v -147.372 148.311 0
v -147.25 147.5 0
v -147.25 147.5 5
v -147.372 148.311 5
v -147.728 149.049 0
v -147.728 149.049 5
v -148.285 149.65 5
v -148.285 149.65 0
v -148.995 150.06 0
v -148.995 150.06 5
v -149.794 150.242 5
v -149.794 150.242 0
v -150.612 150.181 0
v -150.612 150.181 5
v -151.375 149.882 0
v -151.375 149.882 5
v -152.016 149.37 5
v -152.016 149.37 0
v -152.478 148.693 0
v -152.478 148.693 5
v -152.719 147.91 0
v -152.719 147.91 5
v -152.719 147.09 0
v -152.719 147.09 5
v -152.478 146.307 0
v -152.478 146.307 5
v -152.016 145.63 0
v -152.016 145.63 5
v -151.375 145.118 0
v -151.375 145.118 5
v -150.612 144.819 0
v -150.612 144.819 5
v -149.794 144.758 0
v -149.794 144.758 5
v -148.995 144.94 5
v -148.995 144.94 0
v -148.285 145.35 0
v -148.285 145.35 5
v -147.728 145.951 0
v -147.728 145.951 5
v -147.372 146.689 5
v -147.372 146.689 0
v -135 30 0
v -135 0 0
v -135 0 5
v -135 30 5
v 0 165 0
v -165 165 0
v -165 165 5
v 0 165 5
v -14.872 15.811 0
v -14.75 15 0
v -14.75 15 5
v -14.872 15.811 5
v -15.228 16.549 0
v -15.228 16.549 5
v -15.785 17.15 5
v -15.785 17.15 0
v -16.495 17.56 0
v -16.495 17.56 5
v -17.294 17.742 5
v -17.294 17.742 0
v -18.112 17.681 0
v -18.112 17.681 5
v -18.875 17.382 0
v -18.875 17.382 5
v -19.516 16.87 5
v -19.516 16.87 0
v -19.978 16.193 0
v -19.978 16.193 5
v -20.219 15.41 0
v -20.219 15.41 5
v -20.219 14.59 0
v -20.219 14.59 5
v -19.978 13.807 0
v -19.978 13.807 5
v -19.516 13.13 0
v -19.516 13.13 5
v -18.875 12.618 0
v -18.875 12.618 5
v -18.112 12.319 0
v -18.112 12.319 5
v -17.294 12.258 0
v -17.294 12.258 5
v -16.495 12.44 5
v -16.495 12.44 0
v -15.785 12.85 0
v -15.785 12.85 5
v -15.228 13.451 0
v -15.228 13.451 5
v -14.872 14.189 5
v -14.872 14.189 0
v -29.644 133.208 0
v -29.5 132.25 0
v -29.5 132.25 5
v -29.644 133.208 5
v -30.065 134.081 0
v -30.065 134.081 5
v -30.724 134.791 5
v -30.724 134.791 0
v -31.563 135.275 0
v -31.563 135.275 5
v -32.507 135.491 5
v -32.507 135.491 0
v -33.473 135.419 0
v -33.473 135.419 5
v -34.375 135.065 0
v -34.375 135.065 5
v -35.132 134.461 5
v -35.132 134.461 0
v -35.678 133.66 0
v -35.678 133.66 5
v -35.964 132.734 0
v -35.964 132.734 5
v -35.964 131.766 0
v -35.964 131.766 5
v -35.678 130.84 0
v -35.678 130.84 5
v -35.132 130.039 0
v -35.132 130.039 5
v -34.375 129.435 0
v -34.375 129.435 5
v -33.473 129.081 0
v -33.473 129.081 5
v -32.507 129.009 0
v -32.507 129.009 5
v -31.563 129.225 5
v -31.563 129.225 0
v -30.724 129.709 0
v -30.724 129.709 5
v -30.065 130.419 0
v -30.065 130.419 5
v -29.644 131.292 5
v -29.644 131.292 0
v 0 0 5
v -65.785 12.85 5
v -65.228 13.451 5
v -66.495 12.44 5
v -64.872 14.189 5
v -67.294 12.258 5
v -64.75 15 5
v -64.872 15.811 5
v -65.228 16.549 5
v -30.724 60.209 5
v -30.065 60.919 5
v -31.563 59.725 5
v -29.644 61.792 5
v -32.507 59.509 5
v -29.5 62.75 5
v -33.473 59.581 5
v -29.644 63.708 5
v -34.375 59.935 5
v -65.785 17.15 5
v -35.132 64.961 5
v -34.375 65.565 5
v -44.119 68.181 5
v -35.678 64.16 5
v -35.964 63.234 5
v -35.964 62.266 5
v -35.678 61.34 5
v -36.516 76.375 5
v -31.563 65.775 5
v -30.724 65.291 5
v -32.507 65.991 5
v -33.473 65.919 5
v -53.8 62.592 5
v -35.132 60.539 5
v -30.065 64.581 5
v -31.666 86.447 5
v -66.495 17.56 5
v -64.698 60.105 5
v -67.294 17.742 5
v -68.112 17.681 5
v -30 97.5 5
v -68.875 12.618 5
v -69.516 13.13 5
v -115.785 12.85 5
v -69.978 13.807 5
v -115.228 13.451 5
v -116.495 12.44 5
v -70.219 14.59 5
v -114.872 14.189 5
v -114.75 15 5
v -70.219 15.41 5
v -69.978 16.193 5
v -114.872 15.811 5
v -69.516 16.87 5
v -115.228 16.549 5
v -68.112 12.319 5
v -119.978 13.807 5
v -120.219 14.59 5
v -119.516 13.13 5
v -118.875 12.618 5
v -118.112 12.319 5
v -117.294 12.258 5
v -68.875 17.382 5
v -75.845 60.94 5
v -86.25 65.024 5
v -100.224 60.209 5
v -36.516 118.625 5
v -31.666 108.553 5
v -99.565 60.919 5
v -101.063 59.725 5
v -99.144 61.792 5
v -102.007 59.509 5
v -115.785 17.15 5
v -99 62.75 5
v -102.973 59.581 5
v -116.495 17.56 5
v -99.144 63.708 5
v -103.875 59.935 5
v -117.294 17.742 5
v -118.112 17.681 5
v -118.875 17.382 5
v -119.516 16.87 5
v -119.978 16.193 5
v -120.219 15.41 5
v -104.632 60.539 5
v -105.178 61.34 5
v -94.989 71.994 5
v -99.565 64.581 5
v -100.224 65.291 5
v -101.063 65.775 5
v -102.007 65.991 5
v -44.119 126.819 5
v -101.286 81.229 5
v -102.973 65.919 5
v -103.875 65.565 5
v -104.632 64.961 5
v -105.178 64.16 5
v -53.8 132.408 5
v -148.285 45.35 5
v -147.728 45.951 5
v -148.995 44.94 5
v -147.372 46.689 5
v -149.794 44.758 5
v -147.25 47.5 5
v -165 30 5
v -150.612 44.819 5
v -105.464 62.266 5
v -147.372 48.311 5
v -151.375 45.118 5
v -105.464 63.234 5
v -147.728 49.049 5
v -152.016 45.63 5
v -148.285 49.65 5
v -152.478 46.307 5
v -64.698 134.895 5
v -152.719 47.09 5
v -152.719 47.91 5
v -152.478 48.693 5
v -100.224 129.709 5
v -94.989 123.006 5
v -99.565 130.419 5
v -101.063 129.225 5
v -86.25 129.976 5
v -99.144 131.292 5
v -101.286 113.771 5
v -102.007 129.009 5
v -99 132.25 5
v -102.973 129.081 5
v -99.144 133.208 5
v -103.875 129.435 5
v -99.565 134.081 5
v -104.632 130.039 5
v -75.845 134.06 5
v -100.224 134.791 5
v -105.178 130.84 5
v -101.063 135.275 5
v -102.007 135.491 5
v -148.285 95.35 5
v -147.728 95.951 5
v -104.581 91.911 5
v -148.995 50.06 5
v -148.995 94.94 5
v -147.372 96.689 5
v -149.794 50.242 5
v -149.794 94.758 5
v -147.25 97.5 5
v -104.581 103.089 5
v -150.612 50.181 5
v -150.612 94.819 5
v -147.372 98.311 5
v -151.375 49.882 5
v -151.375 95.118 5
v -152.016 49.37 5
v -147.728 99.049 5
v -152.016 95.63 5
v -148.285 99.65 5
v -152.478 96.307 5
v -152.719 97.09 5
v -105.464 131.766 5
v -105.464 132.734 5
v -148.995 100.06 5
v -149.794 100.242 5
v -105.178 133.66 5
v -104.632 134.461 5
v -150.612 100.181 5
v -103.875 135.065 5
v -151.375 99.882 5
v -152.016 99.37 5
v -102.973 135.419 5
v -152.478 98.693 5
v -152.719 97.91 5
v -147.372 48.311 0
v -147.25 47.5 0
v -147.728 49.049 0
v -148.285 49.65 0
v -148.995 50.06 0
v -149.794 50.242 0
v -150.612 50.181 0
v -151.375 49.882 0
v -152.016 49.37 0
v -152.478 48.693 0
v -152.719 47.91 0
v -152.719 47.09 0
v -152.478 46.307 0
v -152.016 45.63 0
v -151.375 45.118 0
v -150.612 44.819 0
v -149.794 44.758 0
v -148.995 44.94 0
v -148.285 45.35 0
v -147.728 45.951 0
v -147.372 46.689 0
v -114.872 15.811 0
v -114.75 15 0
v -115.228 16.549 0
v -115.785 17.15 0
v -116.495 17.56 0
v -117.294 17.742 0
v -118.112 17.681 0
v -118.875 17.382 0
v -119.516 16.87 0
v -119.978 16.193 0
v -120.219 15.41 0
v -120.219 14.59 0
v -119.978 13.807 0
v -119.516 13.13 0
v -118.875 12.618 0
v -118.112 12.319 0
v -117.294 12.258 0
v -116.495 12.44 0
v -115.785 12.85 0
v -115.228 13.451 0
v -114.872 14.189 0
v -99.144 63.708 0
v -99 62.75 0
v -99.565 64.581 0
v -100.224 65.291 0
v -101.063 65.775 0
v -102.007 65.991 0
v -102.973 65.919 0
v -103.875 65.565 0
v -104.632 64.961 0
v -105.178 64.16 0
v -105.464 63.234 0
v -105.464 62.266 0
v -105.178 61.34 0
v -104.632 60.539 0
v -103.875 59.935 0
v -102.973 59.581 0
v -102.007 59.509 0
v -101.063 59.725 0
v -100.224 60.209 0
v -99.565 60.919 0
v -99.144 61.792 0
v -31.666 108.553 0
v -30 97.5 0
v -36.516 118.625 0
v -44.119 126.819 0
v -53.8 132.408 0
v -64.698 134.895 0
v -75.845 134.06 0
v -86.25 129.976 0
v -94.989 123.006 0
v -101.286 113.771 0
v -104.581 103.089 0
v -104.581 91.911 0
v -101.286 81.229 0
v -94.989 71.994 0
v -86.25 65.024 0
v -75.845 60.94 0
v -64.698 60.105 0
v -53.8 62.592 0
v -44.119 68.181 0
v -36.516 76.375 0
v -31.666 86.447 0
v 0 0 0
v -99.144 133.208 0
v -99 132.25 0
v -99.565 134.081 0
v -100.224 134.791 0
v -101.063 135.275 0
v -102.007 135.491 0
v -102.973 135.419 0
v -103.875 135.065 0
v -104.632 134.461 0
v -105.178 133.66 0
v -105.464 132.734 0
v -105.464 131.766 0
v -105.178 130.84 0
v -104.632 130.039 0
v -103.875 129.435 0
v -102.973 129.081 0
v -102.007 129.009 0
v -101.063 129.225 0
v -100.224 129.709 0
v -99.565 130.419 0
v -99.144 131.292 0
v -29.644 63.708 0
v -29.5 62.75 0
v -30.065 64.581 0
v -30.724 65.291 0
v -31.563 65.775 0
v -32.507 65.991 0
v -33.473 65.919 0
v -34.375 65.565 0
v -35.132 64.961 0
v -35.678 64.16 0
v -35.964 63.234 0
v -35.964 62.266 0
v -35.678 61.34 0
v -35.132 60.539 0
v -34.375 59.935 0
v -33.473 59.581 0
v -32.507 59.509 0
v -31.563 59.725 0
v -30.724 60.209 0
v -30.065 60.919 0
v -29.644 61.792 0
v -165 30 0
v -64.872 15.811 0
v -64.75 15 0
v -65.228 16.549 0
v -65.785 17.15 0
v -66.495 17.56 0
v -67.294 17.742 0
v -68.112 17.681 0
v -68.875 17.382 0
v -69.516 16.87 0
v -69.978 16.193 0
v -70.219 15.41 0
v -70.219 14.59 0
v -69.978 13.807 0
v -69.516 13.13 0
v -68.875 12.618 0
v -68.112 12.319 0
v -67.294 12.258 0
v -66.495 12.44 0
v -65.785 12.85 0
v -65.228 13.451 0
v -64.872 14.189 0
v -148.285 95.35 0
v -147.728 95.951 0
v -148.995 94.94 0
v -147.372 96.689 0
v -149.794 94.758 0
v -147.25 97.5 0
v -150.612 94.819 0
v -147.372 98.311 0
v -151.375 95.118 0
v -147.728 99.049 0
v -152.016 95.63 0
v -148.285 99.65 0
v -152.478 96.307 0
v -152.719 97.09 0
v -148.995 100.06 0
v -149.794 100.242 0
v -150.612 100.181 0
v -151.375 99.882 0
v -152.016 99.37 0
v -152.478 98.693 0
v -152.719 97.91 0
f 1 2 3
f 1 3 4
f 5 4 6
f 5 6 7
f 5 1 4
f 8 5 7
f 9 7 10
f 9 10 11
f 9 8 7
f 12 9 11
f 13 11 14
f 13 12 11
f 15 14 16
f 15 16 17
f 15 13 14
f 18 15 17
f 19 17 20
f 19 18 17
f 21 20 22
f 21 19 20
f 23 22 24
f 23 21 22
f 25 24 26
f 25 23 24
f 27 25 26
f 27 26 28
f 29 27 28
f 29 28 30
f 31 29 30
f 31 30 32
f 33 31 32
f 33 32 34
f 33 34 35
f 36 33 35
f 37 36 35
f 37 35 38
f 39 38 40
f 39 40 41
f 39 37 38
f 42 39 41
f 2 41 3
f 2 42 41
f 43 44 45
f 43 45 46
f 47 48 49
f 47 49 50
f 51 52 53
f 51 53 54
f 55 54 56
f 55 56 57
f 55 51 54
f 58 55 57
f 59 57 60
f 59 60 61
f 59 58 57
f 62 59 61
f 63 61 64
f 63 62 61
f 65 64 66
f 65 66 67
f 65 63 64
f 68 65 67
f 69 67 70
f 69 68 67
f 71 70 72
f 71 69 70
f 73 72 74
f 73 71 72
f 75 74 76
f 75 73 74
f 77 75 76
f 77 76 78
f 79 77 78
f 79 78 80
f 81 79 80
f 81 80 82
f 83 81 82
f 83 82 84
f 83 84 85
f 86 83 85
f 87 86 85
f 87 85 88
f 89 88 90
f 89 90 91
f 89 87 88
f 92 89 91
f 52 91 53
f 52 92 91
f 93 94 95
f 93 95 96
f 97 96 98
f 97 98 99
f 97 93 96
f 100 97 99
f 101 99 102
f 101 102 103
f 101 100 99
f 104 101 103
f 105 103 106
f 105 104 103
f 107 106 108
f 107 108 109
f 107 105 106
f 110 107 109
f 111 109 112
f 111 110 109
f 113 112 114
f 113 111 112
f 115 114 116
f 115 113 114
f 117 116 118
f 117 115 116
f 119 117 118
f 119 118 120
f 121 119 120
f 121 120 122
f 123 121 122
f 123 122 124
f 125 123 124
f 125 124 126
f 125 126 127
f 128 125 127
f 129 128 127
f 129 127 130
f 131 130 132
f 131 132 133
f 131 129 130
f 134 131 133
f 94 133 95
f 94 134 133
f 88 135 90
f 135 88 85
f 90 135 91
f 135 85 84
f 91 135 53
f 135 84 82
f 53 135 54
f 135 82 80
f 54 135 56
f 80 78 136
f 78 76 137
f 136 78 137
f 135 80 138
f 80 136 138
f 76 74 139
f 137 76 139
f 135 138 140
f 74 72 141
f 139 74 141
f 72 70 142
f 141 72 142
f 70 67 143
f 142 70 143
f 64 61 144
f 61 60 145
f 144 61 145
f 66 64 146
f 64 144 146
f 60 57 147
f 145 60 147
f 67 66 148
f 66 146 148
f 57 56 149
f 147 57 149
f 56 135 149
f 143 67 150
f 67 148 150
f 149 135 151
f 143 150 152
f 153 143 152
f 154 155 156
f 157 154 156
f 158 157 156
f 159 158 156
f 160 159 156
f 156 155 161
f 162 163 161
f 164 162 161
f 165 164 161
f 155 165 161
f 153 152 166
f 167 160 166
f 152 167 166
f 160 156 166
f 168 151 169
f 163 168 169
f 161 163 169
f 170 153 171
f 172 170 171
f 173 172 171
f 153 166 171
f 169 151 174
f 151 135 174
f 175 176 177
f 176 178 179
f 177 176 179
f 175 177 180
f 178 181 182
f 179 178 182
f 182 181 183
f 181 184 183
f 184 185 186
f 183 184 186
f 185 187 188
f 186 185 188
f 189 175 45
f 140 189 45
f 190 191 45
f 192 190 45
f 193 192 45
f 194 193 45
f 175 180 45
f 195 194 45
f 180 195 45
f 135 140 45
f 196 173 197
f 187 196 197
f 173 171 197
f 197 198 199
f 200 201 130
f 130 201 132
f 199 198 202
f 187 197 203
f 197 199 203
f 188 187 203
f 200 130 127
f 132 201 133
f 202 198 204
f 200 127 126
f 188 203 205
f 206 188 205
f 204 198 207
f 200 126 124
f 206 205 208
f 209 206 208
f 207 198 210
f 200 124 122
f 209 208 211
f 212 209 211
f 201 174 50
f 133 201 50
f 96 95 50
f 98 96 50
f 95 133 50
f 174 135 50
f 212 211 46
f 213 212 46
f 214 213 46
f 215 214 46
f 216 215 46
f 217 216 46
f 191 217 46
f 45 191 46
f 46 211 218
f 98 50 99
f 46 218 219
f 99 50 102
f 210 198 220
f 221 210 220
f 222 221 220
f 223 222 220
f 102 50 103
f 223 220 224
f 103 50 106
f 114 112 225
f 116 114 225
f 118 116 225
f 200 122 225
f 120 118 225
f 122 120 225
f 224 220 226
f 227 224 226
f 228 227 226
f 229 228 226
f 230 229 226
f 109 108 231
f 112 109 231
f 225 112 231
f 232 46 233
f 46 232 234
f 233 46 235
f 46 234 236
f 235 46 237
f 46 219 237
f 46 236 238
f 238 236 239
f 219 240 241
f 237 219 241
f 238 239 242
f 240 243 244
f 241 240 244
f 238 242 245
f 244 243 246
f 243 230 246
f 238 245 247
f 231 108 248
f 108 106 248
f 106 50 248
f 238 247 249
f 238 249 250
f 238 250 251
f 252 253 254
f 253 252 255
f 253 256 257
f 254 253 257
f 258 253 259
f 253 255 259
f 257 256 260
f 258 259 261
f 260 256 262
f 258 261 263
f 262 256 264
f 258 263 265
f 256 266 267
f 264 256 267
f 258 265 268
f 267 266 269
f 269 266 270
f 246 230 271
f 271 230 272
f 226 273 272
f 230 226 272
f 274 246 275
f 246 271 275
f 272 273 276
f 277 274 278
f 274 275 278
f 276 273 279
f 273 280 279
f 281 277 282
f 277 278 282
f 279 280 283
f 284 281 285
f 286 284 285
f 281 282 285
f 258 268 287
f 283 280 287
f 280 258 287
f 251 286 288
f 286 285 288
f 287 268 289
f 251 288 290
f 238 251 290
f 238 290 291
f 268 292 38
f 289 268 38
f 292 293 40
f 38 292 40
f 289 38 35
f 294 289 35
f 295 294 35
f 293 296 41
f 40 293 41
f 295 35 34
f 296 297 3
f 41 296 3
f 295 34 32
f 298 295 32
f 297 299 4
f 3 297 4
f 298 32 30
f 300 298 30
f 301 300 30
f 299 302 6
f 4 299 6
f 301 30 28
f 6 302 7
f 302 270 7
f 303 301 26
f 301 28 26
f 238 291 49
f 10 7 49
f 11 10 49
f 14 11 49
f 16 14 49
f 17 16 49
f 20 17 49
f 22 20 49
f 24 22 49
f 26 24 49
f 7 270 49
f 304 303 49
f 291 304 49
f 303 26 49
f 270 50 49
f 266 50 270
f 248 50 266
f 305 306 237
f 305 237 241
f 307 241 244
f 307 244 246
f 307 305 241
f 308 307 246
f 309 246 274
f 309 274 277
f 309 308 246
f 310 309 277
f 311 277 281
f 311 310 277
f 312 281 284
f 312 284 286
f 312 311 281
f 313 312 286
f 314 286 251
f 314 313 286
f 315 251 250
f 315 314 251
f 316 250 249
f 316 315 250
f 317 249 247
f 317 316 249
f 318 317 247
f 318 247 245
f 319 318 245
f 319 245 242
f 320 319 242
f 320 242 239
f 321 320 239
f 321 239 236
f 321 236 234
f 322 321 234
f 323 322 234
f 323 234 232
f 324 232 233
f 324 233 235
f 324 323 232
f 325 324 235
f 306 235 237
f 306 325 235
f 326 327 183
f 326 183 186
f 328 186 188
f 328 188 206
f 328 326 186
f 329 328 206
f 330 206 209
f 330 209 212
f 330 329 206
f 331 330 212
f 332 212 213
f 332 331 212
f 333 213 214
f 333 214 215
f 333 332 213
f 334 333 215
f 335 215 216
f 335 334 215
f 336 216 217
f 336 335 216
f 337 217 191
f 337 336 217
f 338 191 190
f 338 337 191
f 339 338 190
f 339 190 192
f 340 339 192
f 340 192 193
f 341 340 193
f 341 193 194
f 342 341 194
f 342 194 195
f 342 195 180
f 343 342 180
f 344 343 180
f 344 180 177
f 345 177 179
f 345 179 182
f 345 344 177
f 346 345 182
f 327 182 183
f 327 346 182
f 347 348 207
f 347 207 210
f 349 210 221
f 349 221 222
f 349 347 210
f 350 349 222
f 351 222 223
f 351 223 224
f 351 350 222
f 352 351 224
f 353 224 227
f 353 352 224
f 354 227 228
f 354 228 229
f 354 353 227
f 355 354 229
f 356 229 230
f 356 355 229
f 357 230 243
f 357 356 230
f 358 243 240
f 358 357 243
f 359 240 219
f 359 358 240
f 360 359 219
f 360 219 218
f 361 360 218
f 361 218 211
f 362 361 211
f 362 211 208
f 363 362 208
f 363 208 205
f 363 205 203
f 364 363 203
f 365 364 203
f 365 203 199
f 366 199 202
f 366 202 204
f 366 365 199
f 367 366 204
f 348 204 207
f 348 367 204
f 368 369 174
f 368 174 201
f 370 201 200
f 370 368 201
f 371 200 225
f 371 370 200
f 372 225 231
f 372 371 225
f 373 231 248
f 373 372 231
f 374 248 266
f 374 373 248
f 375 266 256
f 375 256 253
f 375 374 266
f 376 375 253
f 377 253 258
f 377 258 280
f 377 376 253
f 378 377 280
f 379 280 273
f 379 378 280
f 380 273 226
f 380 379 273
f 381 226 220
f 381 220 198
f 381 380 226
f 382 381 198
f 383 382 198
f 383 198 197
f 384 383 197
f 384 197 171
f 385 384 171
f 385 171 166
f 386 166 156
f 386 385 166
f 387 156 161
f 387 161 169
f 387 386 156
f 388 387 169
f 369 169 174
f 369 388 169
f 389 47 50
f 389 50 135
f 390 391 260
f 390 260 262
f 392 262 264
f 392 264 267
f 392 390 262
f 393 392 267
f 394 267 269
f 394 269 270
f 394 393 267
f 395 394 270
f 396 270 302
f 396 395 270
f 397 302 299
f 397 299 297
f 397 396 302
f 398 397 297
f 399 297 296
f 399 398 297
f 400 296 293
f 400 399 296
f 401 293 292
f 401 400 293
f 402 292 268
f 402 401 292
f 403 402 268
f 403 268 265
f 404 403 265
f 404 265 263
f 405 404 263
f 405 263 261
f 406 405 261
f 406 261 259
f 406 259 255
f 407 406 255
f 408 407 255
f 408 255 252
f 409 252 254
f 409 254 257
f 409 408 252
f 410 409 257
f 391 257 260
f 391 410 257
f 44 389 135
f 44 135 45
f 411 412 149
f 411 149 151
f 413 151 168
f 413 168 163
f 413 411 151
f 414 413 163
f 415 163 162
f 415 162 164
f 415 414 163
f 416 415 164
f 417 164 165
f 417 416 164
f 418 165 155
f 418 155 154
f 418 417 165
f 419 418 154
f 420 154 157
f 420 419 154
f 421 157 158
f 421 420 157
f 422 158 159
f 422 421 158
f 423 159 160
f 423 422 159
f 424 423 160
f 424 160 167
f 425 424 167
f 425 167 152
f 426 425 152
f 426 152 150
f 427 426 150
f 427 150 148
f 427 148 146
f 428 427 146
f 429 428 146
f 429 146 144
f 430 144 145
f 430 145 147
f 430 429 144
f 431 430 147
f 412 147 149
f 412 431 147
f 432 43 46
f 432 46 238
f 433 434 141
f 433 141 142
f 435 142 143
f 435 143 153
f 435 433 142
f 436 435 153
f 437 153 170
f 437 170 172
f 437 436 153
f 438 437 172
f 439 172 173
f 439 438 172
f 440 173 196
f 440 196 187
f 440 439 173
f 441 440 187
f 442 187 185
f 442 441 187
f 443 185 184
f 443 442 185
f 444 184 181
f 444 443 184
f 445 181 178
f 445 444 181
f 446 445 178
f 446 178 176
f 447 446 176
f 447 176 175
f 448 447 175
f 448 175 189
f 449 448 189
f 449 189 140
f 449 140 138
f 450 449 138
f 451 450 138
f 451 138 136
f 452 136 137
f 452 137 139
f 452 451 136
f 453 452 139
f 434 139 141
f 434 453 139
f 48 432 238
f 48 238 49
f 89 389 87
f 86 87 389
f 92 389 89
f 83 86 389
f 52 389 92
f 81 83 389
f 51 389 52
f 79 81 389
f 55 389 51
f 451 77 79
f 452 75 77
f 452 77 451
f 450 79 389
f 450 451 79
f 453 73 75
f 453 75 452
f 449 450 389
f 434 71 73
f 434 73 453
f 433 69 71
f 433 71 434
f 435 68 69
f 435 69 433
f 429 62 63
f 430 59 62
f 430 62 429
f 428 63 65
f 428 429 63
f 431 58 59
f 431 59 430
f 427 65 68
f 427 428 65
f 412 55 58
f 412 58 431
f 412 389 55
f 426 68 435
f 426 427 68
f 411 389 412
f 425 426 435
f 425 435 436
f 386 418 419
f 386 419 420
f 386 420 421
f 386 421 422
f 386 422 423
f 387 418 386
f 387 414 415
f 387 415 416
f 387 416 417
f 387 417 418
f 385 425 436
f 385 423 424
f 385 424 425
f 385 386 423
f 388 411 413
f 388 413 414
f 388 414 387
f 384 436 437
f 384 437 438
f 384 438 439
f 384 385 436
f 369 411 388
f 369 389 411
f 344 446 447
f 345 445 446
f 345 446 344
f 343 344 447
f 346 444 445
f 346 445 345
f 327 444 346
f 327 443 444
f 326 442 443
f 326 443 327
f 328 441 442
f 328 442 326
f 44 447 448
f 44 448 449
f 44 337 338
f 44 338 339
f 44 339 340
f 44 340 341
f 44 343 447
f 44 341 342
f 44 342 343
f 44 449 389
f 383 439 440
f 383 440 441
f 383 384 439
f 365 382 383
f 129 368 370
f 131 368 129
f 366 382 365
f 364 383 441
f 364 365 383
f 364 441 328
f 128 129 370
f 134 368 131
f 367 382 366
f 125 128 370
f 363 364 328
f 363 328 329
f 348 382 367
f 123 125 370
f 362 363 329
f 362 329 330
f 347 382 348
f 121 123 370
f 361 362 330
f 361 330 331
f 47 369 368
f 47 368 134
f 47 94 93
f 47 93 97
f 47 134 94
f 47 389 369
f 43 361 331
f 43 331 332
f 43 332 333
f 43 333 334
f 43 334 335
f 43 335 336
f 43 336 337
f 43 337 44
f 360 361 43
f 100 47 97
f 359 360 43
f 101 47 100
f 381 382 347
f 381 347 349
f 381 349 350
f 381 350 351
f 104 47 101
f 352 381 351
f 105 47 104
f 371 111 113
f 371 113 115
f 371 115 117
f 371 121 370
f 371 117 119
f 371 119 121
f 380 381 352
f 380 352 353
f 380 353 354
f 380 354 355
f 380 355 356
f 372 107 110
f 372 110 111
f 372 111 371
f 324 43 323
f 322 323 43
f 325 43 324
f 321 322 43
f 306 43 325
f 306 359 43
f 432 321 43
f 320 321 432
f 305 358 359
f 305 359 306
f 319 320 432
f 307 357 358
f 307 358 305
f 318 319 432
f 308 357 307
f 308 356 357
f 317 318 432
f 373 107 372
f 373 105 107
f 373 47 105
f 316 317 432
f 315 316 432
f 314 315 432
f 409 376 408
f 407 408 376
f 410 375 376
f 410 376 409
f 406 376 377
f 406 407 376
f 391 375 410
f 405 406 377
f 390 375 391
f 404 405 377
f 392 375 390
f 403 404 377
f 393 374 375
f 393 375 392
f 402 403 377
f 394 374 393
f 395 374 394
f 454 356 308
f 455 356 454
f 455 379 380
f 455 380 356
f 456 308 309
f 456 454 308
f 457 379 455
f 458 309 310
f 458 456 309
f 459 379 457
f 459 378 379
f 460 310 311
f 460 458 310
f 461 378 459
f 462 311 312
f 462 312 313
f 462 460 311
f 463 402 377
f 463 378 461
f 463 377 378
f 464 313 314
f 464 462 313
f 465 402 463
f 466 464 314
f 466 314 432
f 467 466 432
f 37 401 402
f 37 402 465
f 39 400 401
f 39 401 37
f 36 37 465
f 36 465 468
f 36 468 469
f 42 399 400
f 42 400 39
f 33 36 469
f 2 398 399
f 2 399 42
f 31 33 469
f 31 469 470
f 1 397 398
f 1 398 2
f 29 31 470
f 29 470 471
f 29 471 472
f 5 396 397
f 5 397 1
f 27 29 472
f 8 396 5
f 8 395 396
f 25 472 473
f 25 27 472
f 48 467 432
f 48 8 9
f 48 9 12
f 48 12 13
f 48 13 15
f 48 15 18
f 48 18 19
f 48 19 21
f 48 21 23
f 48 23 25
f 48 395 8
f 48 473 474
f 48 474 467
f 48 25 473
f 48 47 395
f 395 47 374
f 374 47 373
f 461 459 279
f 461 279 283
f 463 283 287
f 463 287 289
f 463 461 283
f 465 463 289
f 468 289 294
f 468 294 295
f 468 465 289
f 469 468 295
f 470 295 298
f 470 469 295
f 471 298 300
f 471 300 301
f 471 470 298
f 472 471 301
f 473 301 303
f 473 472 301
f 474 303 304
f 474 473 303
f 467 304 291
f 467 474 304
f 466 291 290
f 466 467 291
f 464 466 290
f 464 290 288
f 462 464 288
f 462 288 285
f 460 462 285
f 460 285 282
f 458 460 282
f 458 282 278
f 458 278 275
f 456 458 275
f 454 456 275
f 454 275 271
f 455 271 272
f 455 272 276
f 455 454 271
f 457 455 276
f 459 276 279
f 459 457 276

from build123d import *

# Parameters (mm, degrees)
SKETCH_1_R      = 37.5
SKETCH_1_R_2    = 3.25
SKETCH_1_R_3    = 2.75
EXTRUDE_1_DEPTH = 5


with BuildPart() as part:
    # 草图1 → 凸台-拉伸1 (new body)
    with BuildSketch(Plane.XY):
        Polygon((0, 0), (-135, 0), (-135, 30), (-165, 30), (-165, 165), (0, 165), align=None)
        with Locations((-67.5, 97.5)):
            Circle(SKETCH_1_R, mode=Mode.SUBTRACT)
        with Locations((-102.25, 132.25)):
            Circle(SKETCH_1_R_2, mode=Mode.SUBTRACT)
        with Locations((-32.75, 132.25)):
            Circle(SKETCH_1_R_2, mode=Mode.SUBTRACT)
        with Locations((-32.75, 62.75)):
            Circle(SKETCH_1_R_2, mode=Mode.SUBTRACT)
        with Locations((-102.25, 62.75)):
            Circle(SKETCH_1_R_2, mode=Mode.SUBTRACT)
        with Locations((-150, 147.5)):
            Circle(SKETCH_1_R_3, mode=Mode.SUBTRACT)
        with Locations((-150, 97.5)):
            Circle(SKETCH_1_R_3, mode=Mode.SUBTRACT)
        with Locations((-67.5, 15)):
            Circle(SKETCH_1_R_3, mode=Mode.SUBTRACT)
        with Locations((-17.5, 15)):
            Circle(SKETCH_1_R_3, mode=Mode.SUBTRACT)
        with Locations((-117.5, 15)):
            Circle(SKETCH_1_R_3, mode=Mode.SUBTRACT)
        with Locations((-150, 47.5)):
            Circle(SKETCH_1_R_3, mode=Mode.SUBTRACT)
    extrude(amount=EXTRUDE_1_DEPTH)


solid = part.part
